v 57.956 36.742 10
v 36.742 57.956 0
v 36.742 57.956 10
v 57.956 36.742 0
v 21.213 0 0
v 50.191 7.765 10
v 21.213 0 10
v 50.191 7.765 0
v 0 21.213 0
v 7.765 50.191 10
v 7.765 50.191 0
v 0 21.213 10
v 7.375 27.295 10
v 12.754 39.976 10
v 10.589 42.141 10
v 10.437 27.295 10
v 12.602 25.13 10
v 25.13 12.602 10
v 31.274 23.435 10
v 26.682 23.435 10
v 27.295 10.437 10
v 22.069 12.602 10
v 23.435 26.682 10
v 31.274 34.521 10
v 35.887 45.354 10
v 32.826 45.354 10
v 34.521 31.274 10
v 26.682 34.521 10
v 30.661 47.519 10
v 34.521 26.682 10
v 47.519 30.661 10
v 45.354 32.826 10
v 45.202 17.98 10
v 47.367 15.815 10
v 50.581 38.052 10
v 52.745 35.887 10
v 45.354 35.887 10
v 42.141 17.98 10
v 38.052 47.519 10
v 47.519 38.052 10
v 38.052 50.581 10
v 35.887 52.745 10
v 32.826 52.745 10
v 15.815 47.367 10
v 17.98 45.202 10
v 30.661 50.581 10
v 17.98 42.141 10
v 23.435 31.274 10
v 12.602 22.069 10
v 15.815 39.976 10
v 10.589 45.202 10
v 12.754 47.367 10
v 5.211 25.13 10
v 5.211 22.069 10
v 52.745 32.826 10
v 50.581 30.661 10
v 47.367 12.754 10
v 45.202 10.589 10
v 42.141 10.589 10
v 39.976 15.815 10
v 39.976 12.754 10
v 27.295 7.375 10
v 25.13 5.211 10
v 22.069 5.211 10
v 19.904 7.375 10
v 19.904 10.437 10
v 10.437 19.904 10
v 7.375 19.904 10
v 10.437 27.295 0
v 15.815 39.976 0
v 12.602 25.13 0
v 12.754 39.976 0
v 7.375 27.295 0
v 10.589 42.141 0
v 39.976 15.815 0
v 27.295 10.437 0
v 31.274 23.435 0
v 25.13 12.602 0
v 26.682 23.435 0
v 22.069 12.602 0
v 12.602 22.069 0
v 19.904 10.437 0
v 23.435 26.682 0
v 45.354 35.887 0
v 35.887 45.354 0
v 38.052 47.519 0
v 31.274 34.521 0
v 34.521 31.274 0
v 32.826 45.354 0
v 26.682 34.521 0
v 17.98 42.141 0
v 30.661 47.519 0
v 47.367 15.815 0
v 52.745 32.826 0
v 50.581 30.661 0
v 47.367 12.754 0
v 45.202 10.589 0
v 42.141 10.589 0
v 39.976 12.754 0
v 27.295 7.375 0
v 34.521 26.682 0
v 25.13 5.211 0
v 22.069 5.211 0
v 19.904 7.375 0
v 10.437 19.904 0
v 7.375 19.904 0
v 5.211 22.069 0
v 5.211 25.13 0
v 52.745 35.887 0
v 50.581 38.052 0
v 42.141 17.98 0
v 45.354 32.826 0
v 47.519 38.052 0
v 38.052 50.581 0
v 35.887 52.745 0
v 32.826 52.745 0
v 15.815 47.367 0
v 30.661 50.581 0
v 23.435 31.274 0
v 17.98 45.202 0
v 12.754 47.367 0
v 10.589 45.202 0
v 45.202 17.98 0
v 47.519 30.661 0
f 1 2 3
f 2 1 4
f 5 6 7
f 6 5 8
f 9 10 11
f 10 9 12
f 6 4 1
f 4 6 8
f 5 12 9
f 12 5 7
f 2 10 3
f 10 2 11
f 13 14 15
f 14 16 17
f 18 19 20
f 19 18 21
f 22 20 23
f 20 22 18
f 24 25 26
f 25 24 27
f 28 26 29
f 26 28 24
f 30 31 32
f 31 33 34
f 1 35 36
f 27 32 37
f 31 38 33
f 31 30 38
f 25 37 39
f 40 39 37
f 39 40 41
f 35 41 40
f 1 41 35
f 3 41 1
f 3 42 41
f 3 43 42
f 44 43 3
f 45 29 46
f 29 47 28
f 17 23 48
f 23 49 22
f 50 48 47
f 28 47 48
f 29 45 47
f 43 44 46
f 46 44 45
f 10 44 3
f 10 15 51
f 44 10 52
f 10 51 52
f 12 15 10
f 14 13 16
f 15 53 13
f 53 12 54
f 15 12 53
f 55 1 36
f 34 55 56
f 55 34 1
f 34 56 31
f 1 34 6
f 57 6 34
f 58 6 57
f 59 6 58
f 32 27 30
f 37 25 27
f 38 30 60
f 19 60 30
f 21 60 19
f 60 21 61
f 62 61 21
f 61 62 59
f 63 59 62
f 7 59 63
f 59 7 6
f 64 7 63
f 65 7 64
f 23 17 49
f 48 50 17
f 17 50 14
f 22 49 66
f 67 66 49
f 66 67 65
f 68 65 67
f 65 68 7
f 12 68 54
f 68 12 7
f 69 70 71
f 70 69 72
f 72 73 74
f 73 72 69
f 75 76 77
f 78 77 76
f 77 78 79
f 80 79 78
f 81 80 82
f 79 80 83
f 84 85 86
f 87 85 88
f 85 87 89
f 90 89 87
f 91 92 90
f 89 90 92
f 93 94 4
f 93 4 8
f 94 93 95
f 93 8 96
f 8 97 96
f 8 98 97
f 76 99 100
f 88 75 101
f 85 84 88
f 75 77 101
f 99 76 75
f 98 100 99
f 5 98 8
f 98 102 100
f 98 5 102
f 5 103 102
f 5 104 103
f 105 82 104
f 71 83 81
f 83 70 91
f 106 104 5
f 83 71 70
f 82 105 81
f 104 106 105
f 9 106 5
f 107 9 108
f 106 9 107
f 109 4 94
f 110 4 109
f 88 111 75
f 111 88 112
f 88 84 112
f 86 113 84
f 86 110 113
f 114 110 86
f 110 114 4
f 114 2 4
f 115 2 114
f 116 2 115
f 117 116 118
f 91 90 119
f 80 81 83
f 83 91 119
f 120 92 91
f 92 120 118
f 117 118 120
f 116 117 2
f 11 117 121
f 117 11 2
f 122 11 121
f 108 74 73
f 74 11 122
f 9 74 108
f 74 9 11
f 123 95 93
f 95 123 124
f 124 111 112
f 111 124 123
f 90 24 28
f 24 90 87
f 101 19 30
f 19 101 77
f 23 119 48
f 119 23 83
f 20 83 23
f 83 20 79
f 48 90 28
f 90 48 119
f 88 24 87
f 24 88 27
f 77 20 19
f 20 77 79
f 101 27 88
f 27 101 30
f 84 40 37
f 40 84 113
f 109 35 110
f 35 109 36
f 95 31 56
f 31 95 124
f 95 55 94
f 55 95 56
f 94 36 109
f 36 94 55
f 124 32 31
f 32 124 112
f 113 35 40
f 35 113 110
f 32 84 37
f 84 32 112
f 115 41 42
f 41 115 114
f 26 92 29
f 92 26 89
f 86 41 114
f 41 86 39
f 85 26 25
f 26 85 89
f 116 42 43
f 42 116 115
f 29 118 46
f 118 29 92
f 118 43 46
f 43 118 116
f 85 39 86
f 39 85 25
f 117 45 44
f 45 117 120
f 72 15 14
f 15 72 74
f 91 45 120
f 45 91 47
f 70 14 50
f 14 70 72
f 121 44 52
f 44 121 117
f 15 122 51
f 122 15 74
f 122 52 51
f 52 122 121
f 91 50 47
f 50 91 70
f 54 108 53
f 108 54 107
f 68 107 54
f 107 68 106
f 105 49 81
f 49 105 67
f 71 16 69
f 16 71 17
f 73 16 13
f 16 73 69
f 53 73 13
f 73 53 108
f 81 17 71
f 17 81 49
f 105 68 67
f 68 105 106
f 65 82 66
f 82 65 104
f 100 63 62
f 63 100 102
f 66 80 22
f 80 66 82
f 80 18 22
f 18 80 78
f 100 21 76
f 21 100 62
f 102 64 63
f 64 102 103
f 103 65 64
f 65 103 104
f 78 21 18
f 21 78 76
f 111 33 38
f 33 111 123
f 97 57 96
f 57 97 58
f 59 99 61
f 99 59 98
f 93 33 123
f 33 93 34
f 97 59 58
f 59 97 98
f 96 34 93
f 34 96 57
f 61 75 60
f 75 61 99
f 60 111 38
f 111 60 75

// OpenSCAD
$fn = 32;

// ----------------------------------------------------------------------
// Polygon plate: 6-gon R30, 6 bolt windows
// ----------------------------------------------------------------------

// --- parameters (mm) ---
sides = 6;                // number of polygon sides
plate_r = 30;             // circumscribed radius of the polygon
bore_r = 6;               // centre bore radius
bolts = 6;                // number of bolt windows
ring_r = 20.78;           // bolt-circle radius
bolt_r = 4;               // bolt window radius
plate_t = 10;             // plate thickness, Z (extrusion height)

plate_d = 2 * plate_r;  // circumscribed diameter
bore_d = 2 * bore_r;  // centre bore diameter
bolt_d = 2 * bolt_r;  // bolt window diameter
ring_d = 2 * ring_r;  // bolt-circle diameter

profile = [[57.956, 36.742], [36.742, 57.956], [7.765, 50.191], [0, 21.213], [21.213, 0], [50.191, 7.765]];  // primary outline, 6 points, counter clockwise
void_1 = [[34.521, 31.274], [31.274, 34.521], [26.682, 34.521], [23.435, 31.274], [23.435, 26.682], [26.682, 23.435], [31.274, 23.435], [34.521, 26.682]];  // centre bore, 8 points
void_2 = [[52.745, 35.887], [50.581, 38.052], [47.519, 38.052], [45.354, 35.887], [45.354, 32.826], [47.519, 30.661], [50.581, 30.661], [52.745, 32.826]];  // bolt window 1, 8 points
void_3 = [[38.052, 50.581], [35.887, 52.745], [32.826, 52.745], [30.661, 50.581], [30.661, 47.519], [32.826, 45.354], [35.887, 45.354], [38.052, 47.519]];  // bolt window 2, 8 points
void_4 = [[17.98, 45.202], [15.815, 47.367], [12.754, 47.367], [10.589, 45.202], [10.589, 42.141], [12.754, 39.976], [15.815, 39.976], [17.98, 42.141]];  // bolt window 3, 8 points
void_5 = [[12.602, 25.13], [10.437, 27.295], [7.375, 27.295], [5.211, 25.13], [5.211, 22.069], [7.375, 19.904], [10.437, 19.904], [12.602, 22.069]];  // bolt window 4, 8 points
void_6 = [[27.295, 10.437], [25.13, 12.602], [22.069, 12.602], [19.904, 10.437], [19.904, 7.375], [22.069, 5.211], [25.13, 5.211], [27.295, 7.375]];  // bolt window 5, 8 points
void_7 = [[47.367, 15.815], [45.202, 17.98], [42.141, 17.98], [39.976, 15.815], [39.976, 12.754], [42.141, 10.589], [45.202, 10.589], [47.367, 12.754]];  // bolt window 6, 8 points

// --- the one profile operation ---
difference() {
  linear_extrude(height = plate_t) polygon(points = profile);
  translate([0, 0, -1])
    linear_extrude(height = plate_t + 2) polygon(points = void_1);
  translate([0, 0, -1])
    linear_extrude(height = plate_t + 2) polygon(points = void_2);
  translate([0, 0, -1])
    linear_extrude(height = plate_t + 2) polygon(points = void_3);
  translate([0, 0, -1])
    linear_extrude(height = plate_t + 2) polygon(points = void_4);
  translate([0, 0, -1])
    linear_extrude(height = plate_t + 2) polygon(points = void_5);
  translate([0, 0, -1])
    linear_extrude(height = plate_t + 2) polygon(points = void_6);
  translate([0, 0, -1])
    linear_extrude(height = plate_t + 2) polygon(points = void_7);
}
